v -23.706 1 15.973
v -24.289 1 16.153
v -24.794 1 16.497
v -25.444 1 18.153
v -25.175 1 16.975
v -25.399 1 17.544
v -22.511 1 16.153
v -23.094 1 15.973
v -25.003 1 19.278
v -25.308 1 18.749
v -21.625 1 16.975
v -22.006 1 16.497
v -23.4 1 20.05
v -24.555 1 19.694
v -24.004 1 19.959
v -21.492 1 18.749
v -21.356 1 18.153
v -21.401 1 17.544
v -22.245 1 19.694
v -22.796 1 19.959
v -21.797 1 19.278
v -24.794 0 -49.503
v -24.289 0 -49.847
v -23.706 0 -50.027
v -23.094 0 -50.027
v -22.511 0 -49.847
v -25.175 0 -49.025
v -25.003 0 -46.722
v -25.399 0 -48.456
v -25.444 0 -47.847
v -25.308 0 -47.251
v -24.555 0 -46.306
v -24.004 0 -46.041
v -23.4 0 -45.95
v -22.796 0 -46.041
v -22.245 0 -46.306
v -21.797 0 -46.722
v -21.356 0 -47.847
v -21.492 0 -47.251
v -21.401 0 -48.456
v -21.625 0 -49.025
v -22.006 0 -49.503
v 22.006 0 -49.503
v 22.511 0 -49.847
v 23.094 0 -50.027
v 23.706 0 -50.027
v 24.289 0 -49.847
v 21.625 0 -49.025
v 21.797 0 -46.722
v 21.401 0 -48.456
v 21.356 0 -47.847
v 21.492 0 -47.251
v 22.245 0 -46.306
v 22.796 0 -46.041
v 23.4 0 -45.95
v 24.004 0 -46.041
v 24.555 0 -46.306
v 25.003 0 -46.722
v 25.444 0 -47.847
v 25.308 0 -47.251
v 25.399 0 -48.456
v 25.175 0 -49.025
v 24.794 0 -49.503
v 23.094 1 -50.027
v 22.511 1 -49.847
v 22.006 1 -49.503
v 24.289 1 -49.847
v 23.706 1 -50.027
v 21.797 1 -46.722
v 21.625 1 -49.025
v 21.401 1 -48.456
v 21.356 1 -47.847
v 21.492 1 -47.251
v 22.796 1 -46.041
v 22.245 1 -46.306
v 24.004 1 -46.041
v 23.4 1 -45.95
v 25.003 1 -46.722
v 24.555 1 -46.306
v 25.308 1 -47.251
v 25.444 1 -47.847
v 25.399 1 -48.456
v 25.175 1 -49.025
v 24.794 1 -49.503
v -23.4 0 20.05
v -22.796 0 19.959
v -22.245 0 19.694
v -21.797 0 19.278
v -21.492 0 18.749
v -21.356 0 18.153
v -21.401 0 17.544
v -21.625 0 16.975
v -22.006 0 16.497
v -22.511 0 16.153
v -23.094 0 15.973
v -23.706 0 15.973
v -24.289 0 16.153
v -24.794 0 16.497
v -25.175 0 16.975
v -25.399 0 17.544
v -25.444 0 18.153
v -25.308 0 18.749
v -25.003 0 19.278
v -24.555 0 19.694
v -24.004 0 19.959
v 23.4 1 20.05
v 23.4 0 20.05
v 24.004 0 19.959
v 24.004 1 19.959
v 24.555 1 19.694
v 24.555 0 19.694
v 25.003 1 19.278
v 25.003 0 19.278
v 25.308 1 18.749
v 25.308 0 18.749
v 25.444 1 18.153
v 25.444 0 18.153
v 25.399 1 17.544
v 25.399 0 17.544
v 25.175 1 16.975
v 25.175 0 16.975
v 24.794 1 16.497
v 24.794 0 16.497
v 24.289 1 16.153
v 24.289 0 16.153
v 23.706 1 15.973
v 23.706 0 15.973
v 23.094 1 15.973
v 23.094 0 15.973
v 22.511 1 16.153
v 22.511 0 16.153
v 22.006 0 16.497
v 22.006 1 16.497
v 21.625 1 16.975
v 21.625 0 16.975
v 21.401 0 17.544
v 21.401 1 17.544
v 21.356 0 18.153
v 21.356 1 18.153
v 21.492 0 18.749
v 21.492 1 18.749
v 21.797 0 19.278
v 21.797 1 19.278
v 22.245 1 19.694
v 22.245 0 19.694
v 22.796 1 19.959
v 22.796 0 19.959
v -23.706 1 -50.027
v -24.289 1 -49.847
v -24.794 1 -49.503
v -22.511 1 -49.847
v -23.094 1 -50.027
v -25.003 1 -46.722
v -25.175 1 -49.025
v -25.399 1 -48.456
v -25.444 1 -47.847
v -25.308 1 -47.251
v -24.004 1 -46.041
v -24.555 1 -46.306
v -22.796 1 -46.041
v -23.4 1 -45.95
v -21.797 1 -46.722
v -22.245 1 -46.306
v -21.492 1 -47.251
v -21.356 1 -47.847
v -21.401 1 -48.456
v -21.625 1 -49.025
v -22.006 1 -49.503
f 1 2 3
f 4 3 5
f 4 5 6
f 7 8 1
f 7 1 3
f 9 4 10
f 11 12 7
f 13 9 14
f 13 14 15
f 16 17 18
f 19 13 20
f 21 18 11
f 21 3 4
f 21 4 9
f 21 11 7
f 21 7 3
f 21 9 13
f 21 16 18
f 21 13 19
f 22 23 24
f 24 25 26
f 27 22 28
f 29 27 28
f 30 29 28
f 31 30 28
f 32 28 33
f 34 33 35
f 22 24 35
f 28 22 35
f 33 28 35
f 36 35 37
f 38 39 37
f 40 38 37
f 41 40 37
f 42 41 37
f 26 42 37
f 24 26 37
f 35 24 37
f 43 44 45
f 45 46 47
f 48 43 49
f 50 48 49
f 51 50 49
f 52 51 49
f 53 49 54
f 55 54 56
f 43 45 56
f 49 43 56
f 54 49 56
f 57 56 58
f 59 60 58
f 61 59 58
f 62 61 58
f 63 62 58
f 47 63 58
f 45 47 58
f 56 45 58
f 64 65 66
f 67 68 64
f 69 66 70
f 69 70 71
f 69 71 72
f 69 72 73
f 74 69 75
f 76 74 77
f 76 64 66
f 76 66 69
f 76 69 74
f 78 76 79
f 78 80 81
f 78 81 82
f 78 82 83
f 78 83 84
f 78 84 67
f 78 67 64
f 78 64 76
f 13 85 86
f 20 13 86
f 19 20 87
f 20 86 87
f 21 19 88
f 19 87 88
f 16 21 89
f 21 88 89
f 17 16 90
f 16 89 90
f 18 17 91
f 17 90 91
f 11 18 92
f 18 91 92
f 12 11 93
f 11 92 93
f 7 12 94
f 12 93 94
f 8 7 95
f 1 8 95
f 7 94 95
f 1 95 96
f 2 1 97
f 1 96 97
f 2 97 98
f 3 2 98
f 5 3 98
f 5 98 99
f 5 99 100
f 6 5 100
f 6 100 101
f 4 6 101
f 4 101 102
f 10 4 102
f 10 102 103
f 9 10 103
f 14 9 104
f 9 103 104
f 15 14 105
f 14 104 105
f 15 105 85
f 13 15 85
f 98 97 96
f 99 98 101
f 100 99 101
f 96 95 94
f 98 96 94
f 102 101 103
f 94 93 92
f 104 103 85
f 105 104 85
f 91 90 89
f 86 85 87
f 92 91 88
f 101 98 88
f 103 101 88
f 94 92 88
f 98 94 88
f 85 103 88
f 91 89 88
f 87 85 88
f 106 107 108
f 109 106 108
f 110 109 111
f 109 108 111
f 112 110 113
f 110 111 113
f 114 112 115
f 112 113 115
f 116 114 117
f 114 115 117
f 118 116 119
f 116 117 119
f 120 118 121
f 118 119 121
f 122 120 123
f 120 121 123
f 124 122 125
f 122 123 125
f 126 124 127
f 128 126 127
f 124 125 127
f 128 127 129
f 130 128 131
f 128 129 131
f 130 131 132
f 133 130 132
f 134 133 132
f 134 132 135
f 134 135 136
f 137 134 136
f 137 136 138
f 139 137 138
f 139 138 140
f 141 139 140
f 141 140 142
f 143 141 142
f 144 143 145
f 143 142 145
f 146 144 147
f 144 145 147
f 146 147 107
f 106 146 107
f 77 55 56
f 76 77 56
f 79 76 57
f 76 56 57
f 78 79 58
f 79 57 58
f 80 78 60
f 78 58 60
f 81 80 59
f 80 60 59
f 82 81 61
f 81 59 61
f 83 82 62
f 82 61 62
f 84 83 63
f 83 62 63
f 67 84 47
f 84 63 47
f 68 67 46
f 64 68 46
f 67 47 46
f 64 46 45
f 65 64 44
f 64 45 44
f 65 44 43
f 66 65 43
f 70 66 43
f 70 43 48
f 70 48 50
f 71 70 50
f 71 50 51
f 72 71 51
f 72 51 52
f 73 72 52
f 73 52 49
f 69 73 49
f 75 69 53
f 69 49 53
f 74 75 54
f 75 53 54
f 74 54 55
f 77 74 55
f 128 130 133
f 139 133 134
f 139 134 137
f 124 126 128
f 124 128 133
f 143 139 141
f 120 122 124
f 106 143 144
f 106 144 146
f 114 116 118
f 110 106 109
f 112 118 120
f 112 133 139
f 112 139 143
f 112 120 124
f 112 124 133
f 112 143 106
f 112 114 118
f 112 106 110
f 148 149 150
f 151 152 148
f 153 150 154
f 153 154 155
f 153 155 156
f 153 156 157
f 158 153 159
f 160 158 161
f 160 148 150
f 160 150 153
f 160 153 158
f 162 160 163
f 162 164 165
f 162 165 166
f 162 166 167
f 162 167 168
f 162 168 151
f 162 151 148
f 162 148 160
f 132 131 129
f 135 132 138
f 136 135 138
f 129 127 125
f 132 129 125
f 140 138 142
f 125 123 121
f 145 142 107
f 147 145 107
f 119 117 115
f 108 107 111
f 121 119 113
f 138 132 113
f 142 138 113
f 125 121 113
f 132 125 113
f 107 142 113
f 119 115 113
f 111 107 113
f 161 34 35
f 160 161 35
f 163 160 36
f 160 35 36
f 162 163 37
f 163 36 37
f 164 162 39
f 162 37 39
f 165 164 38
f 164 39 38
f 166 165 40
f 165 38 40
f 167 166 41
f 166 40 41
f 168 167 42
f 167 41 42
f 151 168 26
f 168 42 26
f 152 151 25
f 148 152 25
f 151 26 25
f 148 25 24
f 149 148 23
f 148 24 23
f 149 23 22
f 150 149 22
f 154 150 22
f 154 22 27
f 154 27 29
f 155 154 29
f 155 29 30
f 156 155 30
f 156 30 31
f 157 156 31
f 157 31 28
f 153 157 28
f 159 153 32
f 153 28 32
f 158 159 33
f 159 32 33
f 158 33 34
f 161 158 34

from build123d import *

# Parameters (mm, degrees)
SKETCH1_R           = 2.05
BOSS_EXTRUDE1_DEPTH = 1
SKETCH2_R           = 2.05
BOSS_EXTRUDE2_DEPTH = 1
SKETCH3_R           = 2.05
BOSS_EXTRUDE3_DEPTH = 1
SKETCH4_R           = 2.05
BOSS_EXTRUDE4_DEPTH = 1


with BuildPart() as part:
    # Sketch1 → Boss-Extrude1 (new body)
    with BuildSketch(Plane(origin=(0, 0, 0), x_dir=(1, 0, 0), z_dir=(0, 1, 0))):
        with Locations(Location((-23.4, 48, 0), (0, 0, 270))):
            Circle(SKETCH1_R)
    extrude(amount=BOSS_EXTRUDE1_DEPTH)


with BuildPart() as body_2:
    # Sketch2 → Boss-Extrude2 (new body)
    with BuildSketch(Plane(origin=(0, 0, 0), x_dir=(1, 0, 0), z_dir=(0, 1, 0))):
        with Locations(Location((-23.4, -18, 0), (0, 0, 270))):
            Circle(SKETCH2_R)
    extrude(amount=BOSS_EXTRUDE2_DEPTH)


with BuildPart() as body_3:
    # Sketch3 → Boss-Extrude3 (new body)
    with BuildSketch(Plane(origin=(0, 0, 0), x_dir=(1, 0, 0), z_dir=(0, 1, 0))):
        with Locations(Location((23.4, 48, 0), (0, 0, 270))):
            Circle(SKETCH3_R)
    extrude(amount=BOSS_EXTRUDE3_DEPTH)


with BuildPart() as body_4:
    # Sketch4 → Boss-Extrude4 (new body)
    with BuildSketch(Plane(origin=(0, 0, 0), x_dir=(1, 0, 0), z_dir=(0, 1, 0))):
        with Locations(Location((23.4, -18, 0), (0, 0, 270))):
            Circle(SKETCH4_R)
    extrude(amount=BOSS_EXTRUDE4_DEPTH)


solid = Compound([part.part, body_2.part, body_3.part, body_4.part])
